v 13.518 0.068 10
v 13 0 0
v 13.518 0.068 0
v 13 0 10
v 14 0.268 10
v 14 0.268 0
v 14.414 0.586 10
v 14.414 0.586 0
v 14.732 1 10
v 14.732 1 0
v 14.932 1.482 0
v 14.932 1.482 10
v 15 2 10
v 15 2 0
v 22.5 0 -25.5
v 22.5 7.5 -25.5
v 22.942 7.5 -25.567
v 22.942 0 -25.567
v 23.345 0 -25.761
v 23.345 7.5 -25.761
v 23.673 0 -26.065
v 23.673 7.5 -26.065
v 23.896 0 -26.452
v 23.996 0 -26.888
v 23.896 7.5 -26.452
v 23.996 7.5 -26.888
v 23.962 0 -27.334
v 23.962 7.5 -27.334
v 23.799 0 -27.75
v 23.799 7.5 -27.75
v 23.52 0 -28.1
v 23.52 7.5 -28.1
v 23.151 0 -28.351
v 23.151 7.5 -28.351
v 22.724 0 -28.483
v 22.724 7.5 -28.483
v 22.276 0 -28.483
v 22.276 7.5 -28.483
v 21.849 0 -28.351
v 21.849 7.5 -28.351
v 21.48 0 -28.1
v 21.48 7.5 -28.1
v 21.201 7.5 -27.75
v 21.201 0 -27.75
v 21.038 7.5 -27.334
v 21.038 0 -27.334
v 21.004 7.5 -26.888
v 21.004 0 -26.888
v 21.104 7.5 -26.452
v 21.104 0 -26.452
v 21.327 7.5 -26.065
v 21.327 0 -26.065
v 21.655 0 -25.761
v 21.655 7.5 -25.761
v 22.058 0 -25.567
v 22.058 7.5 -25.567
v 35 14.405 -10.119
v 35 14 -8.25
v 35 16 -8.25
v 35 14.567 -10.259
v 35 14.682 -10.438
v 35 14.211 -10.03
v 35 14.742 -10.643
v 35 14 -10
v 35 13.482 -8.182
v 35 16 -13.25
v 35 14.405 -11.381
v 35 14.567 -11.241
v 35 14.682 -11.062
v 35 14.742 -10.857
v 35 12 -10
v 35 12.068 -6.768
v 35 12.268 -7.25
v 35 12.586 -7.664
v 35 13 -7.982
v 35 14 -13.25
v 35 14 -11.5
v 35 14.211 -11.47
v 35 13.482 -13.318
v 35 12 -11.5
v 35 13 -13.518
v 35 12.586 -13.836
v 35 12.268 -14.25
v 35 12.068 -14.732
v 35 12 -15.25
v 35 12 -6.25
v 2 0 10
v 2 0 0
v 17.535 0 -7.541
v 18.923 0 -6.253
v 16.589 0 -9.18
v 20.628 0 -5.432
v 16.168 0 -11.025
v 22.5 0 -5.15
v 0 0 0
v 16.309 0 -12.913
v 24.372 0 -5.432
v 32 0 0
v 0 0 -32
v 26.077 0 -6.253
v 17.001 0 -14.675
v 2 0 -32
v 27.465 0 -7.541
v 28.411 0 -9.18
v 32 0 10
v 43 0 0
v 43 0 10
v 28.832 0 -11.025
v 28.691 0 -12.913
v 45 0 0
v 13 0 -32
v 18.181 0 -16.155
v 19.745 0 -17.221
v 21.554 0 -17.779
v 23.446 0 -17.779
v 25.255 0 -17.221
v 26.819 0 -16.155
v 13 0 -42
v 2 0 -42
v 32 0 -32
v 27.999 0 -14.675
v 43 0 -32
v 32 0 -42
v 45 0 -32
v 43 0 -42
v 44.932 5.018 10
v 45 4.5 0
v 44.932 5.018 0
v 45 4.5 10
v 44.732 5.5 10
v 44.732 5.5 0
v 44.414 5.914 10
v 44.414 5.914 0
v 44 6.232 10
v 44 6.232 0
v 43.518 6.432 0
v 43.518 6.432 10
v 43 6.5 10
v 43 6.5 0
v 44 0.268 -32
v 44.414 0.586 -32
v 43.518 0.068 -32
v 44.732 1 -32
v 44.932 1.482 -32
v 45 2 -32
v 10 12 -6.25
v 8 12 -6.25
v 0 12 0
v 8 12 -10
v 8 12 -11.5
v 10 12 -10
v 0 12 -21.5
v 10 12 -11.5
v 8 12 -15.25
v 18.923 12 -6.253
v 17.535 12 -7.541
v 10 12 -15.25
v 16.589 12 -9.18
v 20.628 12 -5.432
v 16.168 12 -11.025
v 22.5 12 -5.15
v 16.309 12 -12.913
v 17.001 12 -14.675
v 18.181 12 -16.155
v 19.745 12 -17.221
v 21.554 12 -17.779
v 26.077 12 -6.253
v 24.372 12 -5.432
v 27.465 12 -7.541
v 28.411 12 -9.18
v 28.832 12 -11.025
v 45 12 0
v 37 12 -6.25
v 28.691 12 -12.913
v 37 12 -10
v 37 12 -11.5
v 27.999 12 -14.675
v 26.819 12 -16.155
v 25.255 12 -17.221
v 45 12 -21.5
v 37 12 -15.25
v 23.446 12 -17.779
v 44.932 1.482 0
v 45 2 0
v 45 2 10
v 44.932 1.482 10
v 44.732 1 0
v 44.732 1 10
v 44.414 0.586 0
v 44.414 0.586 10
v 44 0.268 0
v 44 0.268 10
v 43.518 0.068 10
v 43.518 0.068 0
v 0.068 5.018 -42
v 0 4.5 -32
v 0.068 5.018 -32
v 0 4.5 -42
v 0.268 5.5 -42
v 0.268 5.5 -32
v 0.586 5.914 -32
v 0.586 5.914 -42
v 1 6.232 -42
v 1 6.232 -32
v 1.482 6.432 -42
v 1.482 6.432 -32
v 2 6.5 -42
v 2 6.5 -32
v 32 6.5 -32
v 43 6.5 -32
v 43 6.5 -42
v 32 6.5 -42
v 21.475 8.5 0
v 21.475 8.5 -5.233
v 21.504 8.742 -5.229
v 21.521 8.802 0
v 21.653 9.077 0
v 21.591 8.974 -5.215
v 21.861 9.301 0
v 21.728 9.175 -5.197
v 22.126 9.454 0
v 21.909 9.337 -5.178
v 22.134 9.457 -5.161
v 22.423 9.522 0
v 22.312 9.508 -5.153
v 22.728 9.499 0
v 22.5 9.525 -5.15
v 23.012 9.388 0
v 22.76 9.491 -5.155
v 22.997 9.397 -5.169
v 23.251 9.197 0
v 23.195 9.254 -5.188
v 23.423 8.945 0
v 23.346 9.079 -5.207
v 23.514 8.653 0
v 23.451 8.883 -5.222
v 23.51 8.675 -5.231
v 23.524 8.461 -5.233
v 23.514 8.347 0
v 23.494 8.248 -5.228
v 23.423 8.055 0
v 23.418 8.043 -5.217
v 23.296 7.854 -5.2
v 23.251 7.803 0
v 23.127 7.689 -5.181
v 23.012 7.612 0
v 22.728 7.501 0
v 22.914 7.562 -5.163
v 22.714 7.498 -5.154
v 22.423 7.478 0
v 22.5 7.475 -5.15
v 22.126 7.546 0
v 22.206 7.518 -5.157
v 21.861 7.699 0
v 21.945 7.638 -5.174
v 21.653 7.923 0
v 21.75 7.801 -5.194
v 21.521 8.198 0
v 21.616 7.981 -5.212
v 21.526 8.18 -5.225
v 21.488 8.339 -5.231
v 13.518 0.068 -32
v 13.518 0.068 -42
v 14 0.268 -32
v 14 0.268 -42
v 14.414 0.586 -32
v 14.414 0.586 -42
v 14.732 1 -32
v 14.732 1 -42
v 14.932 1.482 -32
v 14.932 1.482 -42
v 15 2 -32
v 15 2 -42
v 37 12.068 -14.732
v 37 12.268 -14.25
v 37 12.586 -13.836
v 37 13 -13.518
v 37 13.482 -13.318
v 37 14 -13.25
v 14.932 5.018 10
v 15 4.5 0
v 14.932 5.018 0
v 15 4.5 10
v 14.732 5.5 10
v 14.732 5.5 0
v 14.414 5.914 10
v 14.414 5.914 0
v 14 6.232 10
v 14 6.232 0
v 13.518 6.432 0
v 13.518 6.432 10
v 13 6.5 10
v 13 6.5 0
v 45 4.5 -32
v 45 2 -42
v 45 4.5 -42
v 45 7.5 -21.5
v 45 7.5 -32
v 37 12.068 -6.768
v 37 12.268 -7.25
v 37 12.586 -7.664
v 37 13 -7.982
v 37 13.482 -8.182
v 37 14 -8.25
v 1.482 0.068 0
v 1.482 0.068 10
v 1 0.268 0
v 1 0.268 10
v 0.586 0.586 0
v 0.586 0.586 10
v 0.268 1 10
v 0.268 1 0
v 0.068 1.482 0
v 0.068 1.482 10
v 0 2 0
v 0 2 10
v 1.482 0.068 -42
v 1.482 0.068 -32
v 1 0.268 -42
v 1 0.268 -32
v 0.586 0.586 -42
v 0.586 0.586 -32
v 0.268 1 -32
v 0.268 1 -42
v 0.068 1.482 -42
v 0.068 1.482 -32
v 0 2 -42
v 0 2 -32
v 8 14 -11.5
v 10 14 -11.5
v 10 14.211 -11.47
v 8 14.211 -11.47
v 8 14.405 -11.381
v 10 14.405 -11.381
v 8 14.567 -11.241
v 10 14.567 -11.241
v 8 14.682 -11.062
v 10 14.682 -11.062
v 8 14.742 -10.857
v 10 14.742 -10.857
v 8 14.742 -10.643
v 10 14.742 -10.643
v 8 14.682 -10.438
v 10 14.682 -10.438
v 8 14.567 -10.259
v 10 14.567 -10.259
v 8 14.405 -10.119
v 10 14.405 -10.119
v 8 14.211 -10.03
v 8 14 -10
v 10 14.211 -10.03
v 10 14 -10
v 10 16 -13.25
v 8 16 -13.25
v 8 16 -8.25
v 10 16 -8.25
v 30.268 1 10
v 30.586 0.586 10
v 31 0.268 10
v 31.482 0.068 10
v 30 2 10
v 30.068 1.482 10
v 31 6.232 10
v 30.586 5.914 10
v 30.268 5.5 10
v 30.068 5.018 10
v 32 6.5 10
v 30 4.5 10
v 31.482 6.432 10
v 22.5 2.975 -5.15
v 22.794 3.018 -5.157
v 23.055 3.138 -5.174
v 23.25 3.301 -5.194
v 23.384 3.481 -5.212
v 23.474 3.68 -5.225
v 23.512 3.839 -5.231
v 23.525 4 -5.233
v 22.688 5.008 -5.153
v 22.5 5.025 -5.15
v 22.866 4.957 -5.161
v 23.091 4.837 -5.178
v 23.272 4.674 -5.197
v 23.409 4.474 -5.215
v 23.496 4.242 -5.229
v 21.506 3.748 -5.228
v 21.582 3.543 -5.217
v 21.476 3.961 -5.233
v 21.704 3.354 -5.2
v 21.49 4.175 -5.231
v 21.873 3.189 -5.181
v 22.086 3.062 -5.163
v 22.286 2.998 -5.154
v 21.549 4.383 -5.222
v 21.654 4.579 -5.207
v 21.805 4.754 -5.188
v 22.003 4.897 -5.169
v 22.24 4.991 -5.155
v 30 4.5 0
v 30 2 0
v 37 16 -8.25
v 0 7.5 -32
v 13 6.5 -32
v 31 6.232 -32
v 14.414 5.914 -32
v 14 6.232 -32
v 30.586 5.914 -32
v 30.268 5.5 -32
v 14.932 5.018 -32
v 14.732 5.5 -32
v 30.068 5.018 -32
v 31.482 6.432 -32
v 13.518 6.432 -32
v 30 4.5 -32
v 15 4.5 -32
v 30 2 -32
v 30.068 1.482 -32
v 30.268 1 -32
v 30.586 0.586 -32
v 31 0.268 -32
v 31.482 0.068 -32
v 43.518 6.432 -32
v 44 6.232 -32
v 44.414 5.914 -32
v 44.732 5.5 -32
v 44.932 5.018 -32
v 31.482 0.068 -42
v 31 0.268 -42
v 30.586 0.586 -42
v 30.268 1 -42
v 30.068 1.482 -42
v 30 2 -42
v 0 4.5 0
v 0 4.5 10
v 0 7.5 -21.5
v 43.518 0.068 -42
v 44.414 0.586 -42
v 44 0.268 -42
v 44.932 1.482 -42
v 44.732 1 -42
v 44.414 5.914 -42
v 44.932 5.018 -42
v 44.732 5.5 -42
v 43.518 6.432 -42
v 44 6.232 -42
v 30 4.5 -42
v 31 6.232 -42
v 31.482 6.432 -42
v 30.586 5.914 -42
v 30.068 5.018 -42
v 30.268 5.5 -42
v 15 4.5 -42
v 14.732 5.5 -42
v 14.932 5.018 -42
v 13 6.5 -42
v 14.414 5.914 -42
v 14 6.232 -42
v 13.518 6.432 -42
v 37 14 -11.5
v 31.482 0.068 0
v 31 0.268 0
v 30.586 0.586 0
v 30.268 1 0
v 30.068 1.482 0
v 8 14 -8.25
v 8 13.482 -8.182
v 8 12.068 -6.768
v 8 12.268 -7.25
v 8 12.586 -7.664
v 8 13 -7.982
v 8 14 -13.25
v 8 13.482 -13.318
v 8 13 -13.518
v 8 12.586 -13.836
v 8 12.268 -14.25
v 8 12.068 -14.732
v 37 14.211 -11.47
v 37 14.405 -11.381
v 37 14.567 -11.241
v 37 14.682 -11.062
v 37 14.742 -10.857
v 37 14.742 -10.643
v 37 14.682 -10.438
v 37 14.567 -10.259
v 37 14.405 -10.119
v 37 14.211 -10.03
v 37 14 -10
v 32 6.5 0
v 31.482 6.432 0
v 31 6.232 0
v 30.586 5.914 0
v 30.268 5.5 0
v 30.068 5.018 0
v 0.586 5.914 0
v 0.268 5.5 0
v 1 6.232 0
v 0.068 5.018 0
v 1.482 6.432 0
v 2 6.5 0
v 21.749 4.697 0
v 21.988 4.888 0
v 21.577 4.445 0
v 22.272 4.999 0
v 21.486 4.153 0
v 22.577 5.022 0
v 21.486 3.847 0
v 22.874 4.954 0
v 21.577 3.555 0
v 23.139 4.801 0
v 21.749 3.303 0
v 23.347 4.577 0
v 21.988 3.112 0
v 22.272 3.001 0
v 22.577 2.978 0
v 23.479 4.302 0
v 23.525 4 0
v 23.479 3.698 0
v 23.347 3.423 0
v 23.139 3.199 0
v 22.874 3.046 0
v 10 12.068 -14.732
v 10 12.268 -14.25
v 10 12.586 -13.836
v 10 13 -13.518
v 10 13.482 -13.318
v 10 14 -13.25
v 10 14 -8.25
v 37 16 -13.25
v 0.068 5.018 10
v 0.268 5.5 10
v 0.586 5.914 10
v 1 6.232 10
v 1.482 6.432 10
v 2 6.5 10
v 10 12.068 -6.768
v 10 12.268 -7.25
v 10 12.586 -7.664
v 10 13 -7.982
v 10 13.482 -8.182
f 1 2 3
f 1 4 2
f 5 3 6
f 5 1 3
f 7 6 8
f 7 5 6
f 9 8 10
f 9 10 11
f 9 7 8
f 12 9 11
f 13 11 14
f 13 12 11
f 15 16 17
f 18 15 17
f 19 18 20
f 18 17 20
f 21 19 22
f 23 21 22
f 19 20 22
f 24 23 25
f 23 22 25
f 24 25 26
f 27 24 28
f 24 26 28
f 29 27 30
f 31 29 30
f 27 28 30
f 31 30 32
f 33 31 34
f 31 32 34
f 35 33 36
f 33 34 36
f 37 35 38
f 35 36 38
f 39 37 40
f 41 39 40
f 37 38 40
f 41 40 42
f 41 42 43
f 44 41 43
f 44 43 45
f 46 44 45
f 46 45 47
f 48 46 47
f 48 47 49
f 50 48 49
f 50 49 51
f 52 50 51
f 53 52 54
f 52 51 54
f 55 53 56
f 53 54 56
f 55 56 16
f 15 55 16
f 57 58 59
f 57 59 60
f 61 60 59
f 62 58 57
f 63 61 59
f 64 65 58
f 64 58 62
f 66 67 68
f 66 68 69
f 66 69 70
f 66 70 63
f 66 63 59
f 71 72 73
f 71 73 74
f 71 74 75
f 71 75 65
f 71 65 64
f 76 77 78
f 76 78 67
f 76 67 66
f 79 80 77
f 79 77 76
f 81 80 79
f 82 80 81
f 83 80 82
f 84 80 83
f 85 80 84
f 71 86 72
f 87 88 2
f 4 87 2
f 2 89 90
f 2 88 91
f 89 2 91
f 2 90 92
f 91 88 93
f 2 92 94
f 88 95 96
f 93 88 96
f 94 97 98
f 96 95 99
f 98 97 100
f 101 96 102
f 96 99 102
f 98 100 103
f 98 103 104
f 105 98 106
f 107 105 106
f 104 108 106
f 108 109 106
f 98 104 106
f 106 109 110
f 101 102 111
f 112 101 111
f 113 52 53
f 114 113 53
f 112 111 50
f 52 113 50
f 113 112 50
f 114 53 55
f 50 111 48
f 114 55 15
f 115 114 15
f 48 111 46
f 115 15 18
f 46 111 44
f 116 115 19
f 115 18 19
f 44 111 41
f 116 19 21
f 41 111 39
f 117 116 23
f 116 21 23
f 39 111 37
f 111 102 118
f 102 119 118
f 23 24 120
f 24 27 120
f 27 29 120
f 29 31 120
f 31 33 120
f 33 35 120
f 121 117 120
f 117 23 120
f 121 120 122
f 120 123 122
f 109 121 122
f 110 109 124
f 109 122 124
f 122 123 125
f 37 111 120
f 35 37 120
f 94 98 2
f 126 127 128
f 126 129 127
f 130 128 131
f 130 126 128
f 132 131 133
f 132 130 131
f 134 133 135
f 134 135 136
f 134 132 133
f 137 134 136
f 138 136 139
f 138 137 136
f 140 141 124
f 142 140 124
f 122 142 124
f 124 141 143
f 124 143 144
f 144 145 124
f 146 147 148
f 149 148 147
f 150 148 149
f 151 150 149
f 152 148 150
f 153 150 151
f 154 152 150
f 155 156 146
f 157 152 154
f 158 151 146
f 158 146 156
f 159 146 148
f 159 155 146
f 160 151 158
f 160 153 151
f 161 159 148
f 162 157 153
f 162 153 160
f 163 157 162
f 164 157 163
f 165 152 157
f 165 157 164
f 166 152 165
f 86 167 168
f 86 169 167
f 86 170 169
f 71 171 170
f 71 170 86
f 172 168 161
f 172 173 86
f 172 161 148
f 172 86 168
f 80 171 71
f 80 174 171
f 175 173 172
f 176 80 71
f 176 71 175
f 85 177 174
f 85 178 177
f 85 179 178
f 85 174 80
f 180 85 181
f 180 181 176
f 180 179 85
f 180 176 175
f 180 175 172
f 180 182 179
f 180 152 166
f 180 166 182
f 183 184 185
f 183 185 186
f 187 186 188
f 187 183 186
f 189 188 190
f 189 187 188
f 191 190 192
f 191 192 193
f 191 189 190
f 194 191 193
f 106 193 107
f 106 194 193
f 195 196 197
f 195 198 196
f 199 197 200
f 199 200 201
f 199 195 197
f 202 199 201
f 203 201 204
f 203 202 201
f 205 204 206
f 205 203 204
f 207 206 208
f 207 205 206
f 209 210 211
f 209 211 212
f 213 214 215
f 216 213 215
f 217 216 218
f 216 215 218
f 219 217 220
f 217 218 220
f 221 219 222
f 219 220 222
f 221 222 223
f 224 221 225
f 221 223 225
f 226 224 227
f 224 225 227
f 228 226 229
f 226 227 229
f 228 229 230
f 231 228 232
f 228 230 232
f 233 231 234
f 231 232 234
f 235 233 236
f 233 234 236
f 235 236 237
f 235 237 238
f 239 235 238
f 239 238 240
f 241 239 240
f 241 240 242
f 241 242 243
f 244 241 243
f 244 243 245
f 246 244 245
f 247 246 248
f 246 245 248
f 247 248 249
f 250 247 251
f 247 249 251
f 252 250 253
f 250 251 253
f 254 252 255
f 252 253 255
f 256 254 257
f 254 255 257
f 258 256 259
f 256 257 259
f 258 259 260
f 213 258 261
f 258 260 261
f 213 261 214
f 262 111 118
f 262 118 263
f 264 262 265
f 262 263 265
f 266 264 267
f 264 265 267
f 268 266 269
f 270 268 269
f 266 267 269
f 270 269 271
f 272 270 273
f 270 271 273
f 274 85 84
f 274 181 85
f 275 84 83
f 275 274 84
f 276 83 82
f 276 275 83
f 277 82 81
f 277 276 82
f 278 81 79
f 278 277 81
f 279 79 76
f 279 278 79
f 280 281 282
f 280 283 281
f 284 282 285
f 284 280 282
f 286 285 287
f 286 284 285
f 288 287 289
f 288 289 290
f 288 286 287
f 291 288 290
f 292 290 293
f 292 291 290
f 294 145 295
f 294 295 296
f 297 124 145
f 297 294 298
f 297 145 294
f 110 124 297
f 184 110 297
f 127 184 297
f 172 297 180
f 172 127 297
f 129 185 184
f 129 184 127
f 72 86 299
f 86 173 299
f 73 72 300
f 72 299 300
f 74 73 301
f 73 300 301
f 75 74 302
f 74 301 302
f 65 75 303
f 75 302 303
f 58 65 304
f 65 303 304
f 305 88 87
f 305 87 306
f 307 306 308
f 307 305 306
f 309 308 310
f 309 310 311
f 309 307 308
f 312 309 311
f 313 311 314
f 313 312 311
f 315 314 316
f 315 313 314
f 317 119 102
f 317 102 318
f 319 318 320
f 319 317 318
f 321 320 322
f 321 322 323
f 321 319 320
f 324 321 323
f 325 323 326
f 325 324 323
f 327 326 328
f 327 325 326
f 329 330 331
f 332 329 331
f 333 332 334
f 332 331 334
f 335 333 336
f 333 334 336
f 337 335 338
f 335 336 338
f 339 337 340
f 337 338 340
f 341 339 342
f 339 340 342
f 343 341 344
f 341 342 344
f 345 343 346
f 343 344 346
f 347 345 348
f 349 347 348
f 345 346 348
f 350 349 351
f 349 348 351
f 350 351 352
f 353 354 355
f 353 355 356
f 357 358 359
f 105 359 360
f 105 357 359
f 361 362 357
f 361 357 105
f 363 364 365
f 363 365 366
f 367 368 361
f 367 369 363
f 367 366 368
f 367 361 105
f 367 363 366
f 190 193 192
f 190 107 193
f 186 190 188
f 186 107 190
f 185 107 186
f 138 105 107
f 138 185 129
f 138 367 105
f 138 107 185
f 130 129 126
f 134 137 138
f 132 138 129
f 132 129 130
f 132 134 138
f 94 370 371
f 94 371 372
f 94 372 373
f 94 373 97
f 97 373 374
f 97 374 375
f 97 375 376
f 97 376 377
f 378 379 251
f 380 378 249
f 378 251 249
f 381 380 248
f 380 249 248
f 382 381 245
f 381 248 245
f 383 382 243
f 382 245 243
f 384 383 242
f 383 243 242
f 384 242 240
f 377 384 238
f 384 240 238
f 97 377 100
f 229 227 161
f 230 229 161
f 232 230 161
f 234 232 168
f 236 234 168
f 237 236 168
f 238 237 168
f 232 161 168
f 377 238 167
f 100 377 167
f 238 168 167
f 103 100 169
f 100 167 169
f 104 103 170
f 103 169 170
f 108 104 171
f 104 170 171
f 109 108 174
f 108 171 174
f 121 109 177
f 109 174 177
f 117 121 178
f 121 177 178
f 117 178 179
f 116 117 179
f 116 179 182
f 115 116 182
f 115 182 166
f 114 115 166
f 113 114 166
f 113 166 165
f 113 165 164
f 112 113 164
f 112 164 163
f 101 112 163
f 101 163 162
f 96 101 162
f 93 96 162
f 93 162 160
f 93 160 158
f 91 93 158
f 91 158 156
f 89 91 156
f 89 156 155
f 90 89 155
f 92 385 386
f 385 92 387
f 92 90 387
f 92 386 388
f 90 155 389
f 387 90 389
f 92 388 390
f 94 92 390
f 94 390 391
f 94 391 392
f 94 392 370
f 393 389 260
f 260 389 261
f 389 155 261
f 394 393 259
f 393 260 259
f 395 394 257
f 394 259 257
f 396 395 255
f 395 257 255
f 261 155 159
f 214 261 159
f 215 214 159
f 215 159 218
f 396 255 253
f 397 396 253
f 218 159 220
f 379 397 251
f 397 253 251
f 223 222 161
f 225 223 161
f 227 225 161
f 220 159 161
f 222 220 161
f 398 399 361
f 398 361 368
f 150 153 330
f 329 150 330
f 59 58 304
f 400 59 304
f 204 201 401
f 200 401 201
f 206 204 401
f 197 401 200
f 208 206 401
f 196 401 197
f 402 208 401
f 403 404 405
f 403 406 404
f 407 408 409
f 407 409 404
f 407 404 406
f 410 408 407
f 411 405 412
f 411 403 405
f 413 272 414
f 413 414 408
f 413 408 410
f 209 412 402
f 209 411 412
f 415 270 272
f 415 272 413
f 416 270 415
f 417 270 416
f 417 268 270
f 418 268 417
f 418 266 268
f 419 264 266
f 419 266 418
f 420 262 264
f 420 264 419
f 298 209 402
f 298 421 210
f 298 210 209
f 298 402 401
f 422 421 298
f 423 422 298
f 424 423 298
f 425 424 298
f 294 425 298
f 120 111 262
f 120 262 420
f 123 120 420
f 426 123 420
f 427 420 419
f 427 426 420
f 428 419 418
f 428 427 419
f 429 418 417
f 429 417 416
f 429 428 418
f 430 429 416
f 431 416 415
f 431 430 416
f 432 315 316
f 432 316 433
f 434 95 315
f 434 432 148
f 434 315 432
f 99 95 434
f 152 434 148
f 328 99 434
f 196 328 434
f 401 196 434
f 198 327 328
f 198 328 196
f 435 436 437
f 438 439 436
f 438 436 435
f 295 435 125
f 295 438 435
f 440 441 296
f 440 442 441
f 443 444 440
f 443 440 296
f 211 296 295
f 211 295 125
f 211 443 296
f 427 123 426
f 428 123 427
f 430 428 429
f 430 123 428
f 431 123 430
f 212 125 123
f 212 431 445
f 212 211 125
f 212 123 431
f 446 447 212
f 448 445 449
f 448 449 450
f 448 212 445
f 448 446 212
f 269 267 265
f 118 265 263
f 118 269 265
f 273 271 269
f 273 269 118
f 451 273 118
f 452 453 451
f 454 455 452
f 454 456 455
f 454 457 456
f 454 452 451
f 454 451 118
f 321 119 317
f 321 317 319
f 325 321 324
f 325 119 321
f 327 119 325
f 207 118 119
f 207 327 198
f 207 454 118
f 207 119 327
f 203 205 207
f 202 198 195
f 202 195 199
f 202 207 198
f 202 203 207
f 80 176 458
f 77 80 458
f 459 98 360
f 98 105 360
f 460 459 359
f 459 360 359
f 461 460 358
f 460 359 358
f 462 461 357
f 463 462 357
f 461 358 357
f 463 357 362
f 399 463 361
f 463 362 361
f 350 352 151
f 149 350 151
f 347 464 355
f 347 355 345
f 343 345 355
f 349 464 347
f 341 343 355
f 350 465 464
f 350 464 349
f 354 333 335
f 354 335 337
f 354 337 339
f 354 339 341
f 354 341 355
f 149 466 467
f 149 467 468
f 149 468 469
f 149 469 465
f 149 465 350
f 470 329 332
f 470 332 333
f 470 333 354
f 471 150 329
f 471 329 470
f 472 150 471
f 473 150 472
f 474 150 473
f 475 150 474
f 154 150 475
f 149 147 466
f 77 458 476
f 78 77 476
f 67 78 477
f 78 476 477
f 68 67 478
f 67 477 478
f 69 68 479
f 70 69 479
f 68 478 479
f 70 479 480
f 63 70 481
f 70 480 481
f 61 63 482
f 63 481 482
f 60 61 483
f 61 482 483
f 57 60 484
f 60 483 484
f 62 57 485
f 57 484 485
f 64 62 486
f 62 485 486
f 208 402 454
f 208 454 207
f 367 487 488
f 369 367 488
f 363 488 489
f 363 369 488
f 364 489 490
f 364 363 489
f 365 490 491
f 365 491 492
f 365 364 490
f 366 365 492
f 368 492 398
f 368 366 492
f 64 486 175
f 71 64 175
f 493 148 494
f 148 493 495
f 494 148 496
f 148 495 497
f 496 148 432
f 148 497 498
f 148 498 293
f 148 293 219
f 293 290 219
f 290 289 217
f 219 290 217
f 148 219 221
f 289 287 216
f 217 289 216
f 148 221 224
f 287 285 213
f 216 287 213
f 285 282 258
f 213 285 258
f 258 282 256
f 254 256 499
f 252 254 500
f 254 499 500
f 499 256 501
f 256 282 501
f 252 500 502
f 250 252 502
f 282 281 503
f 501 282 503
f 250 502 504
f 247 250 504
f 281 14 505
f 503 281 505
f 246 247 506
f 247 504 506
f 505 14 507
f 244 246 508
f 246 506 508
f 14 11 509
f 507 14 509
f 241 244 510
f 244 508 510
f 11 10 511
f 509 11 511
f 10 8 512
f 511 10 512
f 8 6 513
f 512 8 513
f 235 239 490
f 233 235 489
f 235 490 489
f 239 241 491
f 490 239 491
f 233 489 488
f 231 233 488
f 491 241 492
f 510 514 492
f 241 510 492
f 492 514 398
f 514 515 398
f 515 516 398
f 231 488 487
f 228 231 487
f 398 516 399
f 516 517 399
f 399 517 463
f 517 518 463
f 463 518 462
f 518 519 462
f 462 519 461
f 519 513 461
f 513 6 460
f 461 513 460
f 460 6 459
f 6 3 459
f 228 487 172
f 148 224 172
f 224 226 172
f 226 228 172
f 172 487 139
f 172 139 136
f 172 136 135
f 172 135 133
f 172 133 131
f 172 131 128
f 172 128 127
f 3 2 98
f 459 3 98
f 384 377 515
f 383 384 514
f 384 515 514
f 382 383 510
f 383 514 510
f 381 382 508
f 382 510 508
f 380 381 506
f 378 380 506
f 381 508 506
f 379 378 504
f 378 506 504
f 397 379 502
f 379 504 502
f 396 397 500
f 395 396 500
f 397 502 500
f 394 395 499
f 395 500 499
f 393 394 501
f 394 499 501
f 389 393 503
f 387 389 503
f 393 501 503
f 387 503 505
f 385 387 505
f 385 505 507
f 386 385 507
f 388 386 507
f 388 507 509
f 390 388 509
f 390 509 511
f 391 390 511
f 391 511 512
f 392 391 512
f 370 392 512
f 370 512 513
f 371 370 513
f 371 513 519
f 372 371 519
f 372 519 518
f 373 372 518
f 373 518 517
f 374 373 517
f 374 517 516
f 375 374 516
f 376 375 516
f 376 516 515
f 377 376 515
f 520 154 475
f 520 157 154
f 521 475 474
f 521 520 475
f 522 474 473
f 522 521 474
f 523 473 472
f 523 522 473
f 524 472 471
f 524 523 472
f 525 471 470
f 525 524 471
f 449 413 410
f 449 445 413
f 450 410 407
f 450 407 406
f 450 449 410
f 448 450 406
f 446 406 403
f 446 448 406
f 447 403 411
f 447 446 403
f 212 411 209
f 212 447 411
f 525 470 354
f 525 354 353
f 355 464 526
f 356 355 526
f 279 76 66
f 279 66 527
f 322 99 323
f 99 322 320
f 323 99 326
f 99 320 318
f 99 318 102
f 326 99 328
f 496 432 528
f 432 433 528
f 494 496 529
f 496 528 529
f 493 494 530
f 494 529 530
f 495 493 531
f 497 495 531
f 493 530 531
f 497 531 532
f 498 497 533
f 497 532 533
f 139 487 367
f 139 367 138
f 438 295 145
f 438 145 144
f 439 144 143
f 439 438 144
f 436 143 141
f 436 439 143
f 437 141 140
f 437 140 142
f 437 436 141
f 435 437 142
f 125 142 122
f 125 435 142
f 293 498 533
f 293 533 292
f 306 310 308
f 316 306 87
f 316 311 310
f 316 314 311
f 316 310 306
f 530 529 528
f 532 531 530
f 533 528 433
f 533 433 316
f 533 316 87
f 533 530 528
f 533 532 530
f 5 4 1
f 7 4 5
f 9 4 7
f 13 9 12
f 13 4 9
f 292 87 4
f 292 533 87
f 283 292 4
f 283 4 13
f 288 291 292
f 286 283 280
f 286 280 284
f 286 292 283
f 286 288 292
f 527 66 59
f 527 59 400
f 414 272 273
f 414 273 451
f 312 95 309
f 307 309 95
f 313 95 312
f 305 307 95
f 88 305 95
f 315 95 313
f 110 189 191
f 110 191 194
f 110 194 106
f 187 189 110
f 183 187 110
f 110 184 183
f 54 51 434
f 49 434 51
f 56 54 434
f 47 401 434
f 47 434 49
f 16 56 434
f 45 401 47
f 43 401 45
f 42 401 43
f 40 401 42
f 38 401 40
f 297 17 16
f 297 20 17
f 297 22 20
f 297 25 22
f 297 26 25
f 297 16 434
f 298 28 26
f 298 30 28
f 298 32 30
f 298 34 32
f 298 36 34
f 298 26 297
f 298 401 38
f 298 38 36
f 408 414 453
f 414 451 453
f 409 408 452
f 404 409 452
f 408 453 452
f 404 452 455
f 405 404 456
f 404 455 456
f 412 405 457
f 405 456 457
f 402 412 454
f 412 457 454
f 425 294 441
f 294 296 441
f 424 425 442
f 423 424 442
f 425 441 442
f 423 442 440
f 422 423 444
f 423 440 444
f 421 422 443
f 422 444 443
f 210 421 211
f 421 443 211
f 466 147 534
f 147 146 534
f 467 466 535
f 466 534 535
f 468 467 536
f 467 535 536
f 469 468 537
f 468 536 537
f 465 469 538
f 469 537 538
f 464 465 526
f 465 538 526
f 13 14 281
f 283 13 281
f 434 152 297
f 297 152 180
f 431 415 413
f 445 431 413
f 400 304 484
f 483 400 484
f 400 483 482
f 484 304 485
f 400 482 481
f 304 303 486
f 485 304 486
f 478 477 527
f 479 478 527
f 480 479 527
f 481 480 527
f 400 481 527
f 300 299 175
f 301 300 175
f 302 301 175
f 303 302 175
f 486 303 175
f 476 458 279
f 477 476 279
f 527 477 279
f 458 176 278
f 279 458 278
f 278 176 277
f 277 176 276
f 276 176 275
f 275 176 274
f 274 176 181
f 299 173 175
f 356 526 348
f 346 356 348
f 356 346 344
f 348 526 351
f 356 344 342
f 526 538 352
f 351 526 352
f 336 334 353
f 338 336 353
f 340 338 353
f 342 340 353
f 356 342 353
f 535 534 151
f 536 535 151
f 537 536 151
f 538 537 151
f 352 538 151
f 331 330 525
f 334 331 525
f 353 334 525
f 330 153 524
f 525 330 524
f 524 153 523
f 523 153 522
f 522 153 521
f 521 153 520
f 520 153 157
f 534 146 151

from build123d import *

# Parameters (mm, degrees)
SKETCH1_W                    = 45
SKETCH1_H                    = 32
BOSS_EXTRUDE1_DEPTH          = 12
SKETCH2_W                    = 45
SKETCH2_H                    = 10.5
CUT_EXTRUDE1_DEPTH           = 4.5
SKETCH3_R                    = 1.5
CUT_EXTRUDE2_DEPTH           = 7.5
SKETCH4_R                    = 6.35
CUT_EXTRUDE3_DEPTH           = 12
SKETCH5_W                    = 15
SKETCH5_H                    = 6.5
BOSS_EXTRUDE3_DEPTH          = 10
SKETCH6_W                    = 15
SKETCH6_H                    = 6.5
BOSS_EXTRUDE4_DEPTH          = 10
SKETCH7_W                    = 2
SKETCH7_H                    = 5
BOSS_EXTRUDE5_DEPTH          = 4
M2_5X0_45_TAPPED_HOLE1_D     = 2.05
M2_5X0_45_TAPPED_HOLE1_DEPTH = 11.499
M2_5X0_45_TAPPED_HOLE1_TIP   = 0.615882135
CUT_EXTRUDE4_REACH           = 65.6
CUT_EXTRUDE4_END_RADIUS      = 6.35
SKETCH10_R                   = 1.025
FILLET1_DEPTH                = 11
FILLET2_R                    = 2
FILLET3_DEPTH                = 11
FILLET4_R                    = 2
FILLET5_START                = -43
FILLET5_DEPTH                = 11
FILLET6_START                = -43
FILLET6_DEPTH                = 11
FILLET7_R                    = 2
CUT_EXTRUDE5_REACH           = 60.215
FILLET8_R                    = 2


with BuildPart() as part:
    # Sketch1 → Boss-Extrude1 (new body)
    with BuildSketch(Plane(origin=(0, 0, 0), x_dir=(1, 0, 0), z_dir=(0, 1, 0))):
        with Locations((22.5, 16)):
            Rectangle(SKETCH1_W, SKETCH1_H)
    extrude(amount=BOSS_EXTRUDE1_DEPTH)

    # Sketch2 → Cut-Extrude1 (cut)
    with BuildSketch(Plane(origin=(0, 12, 0), x_dir=(1, 0, 0), z_dir=(0, 1, 0))):
        with Locations((22.5, 26.75)):
            Rectangle(SKETCH2_W, SKETCH2_H)
    extrude(amount=-CUT_EXTRUDE1_DEPTH, mode=Mode.SUBTRACT)

    # Sketch3 → Cut-Extrude2 (cut)
    with BuildSketch(Plane(origin=(0, 7.5, 0), x_dir=(1, 0, 0), z_dir=(0, 1, 0))):
        with Locations(Location((22.5, 27, 0), (0, 0, 270))):
            Circle(SKETCH3_R)
    extrude(amount=-CUT_EXTRUDE2_DEPTH, mode=Mode.SUBTRACT)

    # Sketch4 → Cut-Extrude3 (cut)
    with BuildSketch(Plane(origin=(0, 12, 0), x_dir=(1, 0, 0), z_dir=(0, 1, 0))):
        with Locations(Location((22.5, 11.5, 0), (0, 0, 270))):
            Circle(SKETCH4_R)
    extrude(amount=-CUT_EXTRUDE3_DEPTH, mode=Mode.SUBTRACT)

    # Sketch5 → Boss-Extrude3 (add)
    with BuildSketch(Plane(origin=(0, 0, -32), x_dir=(-1, 0, 0), z_dir=(0, 0, -1))):
        with Locations((-37.5, 3.25)):
            Rectangle(SKETCH5_W, SKETCH5_H)
        with Locations((-7.5, 3.25)):
            Rectangle(SKETCH5_W, SKETCH5_H)
    extrude(amount=BOSS_EXTRUDE3_DEPTH)

    # Sketch6 → Boss-Extrude4 (add)
    with BuildSketch(Plane.XY):
        with Locations((7.5, 3.25)):
            Rectangle(SKETCH6_W, SKETCH6_H)
        with Locations((37.5, 3.25)):
            Rectangle(SKETCH6_W, SKETCH6_H)
    extrude(amount=BOSS_EXTRUDE4_DEPTH)

    # Sketch7 → Boss-Extrude5 (add)
    with BuildSketch(Plane(origin=(0, 12, 0), x_dir=(1, 0, 0), z_dir=(0, 1, 0))):
        with Locations((9, 10.75)):
            Rectangle(SKETCH7_W, SKETCH7_H)
        with Locations((36, 10.75)):
            Rectangle(SKETCH7_W, SKETCH7_H)
    extrude(amount=BOSS_EXTRUDE5_DEPTH)

    # M2.5x0.45 Tapped Hole1
    with Locations(Plane.XY):
        with Locations((22.5, 8.5)):
            Hole(M2_5X0_45_TAPPED_HOLE1_D / 2, depth=M2_5X0_45_TAPPED_HOLE1_DEPTH)
            with Locations((0, 0, -(M2_5X0_45_TAPPED_HOLE1_DEPTH + M2_5X0_45_TAPPED_HOLE1_TIP / 2))):  # 118° drill point
                Cone(0, M2_5X0_45_TAPPED_HOLE1_D / 2, M2_5X0_45_TAPPED_HOLE1_TIP, mode=Mode.SUBTRACT)

    # Cut-Extrude4: up to this cylinder (the profile starts outside it)
    cut_extrude4_end = Plane(origin=(22.5, 4, -11.5), z_dir=(0, 1, 0)) * Cylinder(CUT_EXTRUDE4_END_RADIUS, 144.9, mode=Mode.PRIVATE)
    # Sketch10 → Cut-Extrude4 (cut, up to the surface)
    with BuildSketch(Plane.XY, mode=Mode.PRIVATE) as cut_extrude4_sk1:
        with Locations((22.5, 4)):
            Circle(SKETCH10_R)
    cut_extrude4_tool1 = extrude(cut_extrude4_sk1.sketch, amount=-CUT_EXTRUDE4_REACH, mode=Mode.PRIVATE) - cut_extrude4_end
    add(cut_extrude4_tool1.solids().sort_by_distance((22.5, 4, 0))[0], mode=Mode.SUBTRACT)

    # Fillet1: read off the stored shape, not the designer's step
    # Fillet1 outline → Fillet1 (cut)
    with BuildSketch(Plane.XY):
        with BuildLine():
            Line((0, 0), (2, 0))
            ThreePointArc((2, 0), (0.585786438, 0.585786438), (0, 2))
            Line((0, 2), (0, 0))
        make_face()
    extrude(amount=FILLET1_DEPTH, mode=Mode.SUBTRACT)

    # Fillet2
    fillet2_edges = [part.edges().sort_by_distance(p)[0] for p in [
        (15, 0, 5),
        (30, 0, 5),
    ]]
    fillet(fillet2_edges, radius=FILLET2_R)

    # Fillet3: read off the stored shape, not the designer's step
    # Fillet3 outline → Fillet3 (cut)
    with BuildSketch(Plane.XY):
        with BuildLine():
            ThreePointArc((45, 2), (44.414213562, 0.585786438), (43, 0))
            Line((43, 0), (45, 0))
            Line((45, 0), (45, 2))
        make_face()
    extrude(amount=FILLET3_DEPTH, mode=Mode.SUBTRACT)

    # Fillet4
    fillet4_edges = [part.edges().sort_by_distance(p)[0] for p in [
        (30, 0, -37),
        (15, 0, -37),
    ]]
    fillet(fillet4_edges, radius=FILLET4_R)

    # Fillet5: read off the stored shape, not the designer's step
    # Fillet5 outline → Fillet5 (cut)
    with BuildSketch(Plane.XY.offset(FILLET5_START)):
        with BuildLine():
            ThreePointArc((45, 2), (44.414213562, 0.585786438), (43, 0))
            Line((43, 0), (45, 0))
            Line((45, 0), (45, 2))
        make_face()
    extrude(amount=FILLET5_DEPTH, mode=Mode.SUBTRACT)

    # Fillet6: read off the stored shape, not the designer's step
    # Fillet6 outline → Fillet6 (cut)
    with BuildSketch(Plane.XY.offset(FILLET6_START)):
        with BuildLine():
            Line((0, 0), (2, 0))
            ThreePointArc((2, 0), (0.585786438, 0.585786438), (0, 2))
            Line((0, 2), (0, 0))
        make_face()
    extrude(amount=FILLET6_DEPTH, mode=Mode.SUBTRACT)

    # Fillet7
    fillet7_edges = [part.edges().sort_by_distance(p)[0] for p in [
        (45, 6.5, -37),
        (30, 6.5, -37),
        (15, 6.5, -37),
        (0, 6.5, -37),
        (0, 6.5, 5),
        (15, 6.5, 5),
        (45, 6.5, 5),
        (30, 6.5, 5),
    ]]
    fillet(fillet7_edges, radius=FILLET7_R)

    # Cut-Extrude5: up to this face of the body (flat: up to its plane)
    cut_extrude5_end = Plane(part.part.faces().sort_by_distance((8, 14, -10.75))[0])
    # Sketch11 → Cut-Extrude5 (cut, up to the picked face)
    with BuildSketch(Plane(origin=(37, 0, 0), x_dir=(0, 0, -1), z_dir=(1, 0, 0)), mode=Mode.PRIVATE) as cut_extrude5_sk1:
        with BuildLine():
            Line((10, 14), (10, 12))
            Line((10, 12), (11.5, 12))
            Line((11.5, 12), (11.5, 14))
            ThreePointArc((11.5, 14), (10.75, 14.75), (10, 14))
        make_face()
    cut_extrude5_tool1 = split(extrude(cut_extrude5_sk1.sketch, amount=-CUT_EXTRUDE5_REACH, mode=Mode.PRIVATE), bisect_by=cut_extrude5_end, keep=Keep.BOTH, mode=Mode.PRIVATE)
    add(cut_extrude5_tool1.solids().sort_by(Axis((37, 13.299936, -10.75), (-1, 0, 0)))[0], mode=Mode.SUBTRACT)

    # Fillet8
    fillet8_edges = [part.edges().sort_by_distance(p)[0] for p in [
        (36, 12, -13.25),
        (9, 12, -8.25),
        (9, 12, -13.25),
        (36, 12, -8.25),
    ]]
    fillet(fillet8_edges, radius=FILLET8_R)


solid = part.part
